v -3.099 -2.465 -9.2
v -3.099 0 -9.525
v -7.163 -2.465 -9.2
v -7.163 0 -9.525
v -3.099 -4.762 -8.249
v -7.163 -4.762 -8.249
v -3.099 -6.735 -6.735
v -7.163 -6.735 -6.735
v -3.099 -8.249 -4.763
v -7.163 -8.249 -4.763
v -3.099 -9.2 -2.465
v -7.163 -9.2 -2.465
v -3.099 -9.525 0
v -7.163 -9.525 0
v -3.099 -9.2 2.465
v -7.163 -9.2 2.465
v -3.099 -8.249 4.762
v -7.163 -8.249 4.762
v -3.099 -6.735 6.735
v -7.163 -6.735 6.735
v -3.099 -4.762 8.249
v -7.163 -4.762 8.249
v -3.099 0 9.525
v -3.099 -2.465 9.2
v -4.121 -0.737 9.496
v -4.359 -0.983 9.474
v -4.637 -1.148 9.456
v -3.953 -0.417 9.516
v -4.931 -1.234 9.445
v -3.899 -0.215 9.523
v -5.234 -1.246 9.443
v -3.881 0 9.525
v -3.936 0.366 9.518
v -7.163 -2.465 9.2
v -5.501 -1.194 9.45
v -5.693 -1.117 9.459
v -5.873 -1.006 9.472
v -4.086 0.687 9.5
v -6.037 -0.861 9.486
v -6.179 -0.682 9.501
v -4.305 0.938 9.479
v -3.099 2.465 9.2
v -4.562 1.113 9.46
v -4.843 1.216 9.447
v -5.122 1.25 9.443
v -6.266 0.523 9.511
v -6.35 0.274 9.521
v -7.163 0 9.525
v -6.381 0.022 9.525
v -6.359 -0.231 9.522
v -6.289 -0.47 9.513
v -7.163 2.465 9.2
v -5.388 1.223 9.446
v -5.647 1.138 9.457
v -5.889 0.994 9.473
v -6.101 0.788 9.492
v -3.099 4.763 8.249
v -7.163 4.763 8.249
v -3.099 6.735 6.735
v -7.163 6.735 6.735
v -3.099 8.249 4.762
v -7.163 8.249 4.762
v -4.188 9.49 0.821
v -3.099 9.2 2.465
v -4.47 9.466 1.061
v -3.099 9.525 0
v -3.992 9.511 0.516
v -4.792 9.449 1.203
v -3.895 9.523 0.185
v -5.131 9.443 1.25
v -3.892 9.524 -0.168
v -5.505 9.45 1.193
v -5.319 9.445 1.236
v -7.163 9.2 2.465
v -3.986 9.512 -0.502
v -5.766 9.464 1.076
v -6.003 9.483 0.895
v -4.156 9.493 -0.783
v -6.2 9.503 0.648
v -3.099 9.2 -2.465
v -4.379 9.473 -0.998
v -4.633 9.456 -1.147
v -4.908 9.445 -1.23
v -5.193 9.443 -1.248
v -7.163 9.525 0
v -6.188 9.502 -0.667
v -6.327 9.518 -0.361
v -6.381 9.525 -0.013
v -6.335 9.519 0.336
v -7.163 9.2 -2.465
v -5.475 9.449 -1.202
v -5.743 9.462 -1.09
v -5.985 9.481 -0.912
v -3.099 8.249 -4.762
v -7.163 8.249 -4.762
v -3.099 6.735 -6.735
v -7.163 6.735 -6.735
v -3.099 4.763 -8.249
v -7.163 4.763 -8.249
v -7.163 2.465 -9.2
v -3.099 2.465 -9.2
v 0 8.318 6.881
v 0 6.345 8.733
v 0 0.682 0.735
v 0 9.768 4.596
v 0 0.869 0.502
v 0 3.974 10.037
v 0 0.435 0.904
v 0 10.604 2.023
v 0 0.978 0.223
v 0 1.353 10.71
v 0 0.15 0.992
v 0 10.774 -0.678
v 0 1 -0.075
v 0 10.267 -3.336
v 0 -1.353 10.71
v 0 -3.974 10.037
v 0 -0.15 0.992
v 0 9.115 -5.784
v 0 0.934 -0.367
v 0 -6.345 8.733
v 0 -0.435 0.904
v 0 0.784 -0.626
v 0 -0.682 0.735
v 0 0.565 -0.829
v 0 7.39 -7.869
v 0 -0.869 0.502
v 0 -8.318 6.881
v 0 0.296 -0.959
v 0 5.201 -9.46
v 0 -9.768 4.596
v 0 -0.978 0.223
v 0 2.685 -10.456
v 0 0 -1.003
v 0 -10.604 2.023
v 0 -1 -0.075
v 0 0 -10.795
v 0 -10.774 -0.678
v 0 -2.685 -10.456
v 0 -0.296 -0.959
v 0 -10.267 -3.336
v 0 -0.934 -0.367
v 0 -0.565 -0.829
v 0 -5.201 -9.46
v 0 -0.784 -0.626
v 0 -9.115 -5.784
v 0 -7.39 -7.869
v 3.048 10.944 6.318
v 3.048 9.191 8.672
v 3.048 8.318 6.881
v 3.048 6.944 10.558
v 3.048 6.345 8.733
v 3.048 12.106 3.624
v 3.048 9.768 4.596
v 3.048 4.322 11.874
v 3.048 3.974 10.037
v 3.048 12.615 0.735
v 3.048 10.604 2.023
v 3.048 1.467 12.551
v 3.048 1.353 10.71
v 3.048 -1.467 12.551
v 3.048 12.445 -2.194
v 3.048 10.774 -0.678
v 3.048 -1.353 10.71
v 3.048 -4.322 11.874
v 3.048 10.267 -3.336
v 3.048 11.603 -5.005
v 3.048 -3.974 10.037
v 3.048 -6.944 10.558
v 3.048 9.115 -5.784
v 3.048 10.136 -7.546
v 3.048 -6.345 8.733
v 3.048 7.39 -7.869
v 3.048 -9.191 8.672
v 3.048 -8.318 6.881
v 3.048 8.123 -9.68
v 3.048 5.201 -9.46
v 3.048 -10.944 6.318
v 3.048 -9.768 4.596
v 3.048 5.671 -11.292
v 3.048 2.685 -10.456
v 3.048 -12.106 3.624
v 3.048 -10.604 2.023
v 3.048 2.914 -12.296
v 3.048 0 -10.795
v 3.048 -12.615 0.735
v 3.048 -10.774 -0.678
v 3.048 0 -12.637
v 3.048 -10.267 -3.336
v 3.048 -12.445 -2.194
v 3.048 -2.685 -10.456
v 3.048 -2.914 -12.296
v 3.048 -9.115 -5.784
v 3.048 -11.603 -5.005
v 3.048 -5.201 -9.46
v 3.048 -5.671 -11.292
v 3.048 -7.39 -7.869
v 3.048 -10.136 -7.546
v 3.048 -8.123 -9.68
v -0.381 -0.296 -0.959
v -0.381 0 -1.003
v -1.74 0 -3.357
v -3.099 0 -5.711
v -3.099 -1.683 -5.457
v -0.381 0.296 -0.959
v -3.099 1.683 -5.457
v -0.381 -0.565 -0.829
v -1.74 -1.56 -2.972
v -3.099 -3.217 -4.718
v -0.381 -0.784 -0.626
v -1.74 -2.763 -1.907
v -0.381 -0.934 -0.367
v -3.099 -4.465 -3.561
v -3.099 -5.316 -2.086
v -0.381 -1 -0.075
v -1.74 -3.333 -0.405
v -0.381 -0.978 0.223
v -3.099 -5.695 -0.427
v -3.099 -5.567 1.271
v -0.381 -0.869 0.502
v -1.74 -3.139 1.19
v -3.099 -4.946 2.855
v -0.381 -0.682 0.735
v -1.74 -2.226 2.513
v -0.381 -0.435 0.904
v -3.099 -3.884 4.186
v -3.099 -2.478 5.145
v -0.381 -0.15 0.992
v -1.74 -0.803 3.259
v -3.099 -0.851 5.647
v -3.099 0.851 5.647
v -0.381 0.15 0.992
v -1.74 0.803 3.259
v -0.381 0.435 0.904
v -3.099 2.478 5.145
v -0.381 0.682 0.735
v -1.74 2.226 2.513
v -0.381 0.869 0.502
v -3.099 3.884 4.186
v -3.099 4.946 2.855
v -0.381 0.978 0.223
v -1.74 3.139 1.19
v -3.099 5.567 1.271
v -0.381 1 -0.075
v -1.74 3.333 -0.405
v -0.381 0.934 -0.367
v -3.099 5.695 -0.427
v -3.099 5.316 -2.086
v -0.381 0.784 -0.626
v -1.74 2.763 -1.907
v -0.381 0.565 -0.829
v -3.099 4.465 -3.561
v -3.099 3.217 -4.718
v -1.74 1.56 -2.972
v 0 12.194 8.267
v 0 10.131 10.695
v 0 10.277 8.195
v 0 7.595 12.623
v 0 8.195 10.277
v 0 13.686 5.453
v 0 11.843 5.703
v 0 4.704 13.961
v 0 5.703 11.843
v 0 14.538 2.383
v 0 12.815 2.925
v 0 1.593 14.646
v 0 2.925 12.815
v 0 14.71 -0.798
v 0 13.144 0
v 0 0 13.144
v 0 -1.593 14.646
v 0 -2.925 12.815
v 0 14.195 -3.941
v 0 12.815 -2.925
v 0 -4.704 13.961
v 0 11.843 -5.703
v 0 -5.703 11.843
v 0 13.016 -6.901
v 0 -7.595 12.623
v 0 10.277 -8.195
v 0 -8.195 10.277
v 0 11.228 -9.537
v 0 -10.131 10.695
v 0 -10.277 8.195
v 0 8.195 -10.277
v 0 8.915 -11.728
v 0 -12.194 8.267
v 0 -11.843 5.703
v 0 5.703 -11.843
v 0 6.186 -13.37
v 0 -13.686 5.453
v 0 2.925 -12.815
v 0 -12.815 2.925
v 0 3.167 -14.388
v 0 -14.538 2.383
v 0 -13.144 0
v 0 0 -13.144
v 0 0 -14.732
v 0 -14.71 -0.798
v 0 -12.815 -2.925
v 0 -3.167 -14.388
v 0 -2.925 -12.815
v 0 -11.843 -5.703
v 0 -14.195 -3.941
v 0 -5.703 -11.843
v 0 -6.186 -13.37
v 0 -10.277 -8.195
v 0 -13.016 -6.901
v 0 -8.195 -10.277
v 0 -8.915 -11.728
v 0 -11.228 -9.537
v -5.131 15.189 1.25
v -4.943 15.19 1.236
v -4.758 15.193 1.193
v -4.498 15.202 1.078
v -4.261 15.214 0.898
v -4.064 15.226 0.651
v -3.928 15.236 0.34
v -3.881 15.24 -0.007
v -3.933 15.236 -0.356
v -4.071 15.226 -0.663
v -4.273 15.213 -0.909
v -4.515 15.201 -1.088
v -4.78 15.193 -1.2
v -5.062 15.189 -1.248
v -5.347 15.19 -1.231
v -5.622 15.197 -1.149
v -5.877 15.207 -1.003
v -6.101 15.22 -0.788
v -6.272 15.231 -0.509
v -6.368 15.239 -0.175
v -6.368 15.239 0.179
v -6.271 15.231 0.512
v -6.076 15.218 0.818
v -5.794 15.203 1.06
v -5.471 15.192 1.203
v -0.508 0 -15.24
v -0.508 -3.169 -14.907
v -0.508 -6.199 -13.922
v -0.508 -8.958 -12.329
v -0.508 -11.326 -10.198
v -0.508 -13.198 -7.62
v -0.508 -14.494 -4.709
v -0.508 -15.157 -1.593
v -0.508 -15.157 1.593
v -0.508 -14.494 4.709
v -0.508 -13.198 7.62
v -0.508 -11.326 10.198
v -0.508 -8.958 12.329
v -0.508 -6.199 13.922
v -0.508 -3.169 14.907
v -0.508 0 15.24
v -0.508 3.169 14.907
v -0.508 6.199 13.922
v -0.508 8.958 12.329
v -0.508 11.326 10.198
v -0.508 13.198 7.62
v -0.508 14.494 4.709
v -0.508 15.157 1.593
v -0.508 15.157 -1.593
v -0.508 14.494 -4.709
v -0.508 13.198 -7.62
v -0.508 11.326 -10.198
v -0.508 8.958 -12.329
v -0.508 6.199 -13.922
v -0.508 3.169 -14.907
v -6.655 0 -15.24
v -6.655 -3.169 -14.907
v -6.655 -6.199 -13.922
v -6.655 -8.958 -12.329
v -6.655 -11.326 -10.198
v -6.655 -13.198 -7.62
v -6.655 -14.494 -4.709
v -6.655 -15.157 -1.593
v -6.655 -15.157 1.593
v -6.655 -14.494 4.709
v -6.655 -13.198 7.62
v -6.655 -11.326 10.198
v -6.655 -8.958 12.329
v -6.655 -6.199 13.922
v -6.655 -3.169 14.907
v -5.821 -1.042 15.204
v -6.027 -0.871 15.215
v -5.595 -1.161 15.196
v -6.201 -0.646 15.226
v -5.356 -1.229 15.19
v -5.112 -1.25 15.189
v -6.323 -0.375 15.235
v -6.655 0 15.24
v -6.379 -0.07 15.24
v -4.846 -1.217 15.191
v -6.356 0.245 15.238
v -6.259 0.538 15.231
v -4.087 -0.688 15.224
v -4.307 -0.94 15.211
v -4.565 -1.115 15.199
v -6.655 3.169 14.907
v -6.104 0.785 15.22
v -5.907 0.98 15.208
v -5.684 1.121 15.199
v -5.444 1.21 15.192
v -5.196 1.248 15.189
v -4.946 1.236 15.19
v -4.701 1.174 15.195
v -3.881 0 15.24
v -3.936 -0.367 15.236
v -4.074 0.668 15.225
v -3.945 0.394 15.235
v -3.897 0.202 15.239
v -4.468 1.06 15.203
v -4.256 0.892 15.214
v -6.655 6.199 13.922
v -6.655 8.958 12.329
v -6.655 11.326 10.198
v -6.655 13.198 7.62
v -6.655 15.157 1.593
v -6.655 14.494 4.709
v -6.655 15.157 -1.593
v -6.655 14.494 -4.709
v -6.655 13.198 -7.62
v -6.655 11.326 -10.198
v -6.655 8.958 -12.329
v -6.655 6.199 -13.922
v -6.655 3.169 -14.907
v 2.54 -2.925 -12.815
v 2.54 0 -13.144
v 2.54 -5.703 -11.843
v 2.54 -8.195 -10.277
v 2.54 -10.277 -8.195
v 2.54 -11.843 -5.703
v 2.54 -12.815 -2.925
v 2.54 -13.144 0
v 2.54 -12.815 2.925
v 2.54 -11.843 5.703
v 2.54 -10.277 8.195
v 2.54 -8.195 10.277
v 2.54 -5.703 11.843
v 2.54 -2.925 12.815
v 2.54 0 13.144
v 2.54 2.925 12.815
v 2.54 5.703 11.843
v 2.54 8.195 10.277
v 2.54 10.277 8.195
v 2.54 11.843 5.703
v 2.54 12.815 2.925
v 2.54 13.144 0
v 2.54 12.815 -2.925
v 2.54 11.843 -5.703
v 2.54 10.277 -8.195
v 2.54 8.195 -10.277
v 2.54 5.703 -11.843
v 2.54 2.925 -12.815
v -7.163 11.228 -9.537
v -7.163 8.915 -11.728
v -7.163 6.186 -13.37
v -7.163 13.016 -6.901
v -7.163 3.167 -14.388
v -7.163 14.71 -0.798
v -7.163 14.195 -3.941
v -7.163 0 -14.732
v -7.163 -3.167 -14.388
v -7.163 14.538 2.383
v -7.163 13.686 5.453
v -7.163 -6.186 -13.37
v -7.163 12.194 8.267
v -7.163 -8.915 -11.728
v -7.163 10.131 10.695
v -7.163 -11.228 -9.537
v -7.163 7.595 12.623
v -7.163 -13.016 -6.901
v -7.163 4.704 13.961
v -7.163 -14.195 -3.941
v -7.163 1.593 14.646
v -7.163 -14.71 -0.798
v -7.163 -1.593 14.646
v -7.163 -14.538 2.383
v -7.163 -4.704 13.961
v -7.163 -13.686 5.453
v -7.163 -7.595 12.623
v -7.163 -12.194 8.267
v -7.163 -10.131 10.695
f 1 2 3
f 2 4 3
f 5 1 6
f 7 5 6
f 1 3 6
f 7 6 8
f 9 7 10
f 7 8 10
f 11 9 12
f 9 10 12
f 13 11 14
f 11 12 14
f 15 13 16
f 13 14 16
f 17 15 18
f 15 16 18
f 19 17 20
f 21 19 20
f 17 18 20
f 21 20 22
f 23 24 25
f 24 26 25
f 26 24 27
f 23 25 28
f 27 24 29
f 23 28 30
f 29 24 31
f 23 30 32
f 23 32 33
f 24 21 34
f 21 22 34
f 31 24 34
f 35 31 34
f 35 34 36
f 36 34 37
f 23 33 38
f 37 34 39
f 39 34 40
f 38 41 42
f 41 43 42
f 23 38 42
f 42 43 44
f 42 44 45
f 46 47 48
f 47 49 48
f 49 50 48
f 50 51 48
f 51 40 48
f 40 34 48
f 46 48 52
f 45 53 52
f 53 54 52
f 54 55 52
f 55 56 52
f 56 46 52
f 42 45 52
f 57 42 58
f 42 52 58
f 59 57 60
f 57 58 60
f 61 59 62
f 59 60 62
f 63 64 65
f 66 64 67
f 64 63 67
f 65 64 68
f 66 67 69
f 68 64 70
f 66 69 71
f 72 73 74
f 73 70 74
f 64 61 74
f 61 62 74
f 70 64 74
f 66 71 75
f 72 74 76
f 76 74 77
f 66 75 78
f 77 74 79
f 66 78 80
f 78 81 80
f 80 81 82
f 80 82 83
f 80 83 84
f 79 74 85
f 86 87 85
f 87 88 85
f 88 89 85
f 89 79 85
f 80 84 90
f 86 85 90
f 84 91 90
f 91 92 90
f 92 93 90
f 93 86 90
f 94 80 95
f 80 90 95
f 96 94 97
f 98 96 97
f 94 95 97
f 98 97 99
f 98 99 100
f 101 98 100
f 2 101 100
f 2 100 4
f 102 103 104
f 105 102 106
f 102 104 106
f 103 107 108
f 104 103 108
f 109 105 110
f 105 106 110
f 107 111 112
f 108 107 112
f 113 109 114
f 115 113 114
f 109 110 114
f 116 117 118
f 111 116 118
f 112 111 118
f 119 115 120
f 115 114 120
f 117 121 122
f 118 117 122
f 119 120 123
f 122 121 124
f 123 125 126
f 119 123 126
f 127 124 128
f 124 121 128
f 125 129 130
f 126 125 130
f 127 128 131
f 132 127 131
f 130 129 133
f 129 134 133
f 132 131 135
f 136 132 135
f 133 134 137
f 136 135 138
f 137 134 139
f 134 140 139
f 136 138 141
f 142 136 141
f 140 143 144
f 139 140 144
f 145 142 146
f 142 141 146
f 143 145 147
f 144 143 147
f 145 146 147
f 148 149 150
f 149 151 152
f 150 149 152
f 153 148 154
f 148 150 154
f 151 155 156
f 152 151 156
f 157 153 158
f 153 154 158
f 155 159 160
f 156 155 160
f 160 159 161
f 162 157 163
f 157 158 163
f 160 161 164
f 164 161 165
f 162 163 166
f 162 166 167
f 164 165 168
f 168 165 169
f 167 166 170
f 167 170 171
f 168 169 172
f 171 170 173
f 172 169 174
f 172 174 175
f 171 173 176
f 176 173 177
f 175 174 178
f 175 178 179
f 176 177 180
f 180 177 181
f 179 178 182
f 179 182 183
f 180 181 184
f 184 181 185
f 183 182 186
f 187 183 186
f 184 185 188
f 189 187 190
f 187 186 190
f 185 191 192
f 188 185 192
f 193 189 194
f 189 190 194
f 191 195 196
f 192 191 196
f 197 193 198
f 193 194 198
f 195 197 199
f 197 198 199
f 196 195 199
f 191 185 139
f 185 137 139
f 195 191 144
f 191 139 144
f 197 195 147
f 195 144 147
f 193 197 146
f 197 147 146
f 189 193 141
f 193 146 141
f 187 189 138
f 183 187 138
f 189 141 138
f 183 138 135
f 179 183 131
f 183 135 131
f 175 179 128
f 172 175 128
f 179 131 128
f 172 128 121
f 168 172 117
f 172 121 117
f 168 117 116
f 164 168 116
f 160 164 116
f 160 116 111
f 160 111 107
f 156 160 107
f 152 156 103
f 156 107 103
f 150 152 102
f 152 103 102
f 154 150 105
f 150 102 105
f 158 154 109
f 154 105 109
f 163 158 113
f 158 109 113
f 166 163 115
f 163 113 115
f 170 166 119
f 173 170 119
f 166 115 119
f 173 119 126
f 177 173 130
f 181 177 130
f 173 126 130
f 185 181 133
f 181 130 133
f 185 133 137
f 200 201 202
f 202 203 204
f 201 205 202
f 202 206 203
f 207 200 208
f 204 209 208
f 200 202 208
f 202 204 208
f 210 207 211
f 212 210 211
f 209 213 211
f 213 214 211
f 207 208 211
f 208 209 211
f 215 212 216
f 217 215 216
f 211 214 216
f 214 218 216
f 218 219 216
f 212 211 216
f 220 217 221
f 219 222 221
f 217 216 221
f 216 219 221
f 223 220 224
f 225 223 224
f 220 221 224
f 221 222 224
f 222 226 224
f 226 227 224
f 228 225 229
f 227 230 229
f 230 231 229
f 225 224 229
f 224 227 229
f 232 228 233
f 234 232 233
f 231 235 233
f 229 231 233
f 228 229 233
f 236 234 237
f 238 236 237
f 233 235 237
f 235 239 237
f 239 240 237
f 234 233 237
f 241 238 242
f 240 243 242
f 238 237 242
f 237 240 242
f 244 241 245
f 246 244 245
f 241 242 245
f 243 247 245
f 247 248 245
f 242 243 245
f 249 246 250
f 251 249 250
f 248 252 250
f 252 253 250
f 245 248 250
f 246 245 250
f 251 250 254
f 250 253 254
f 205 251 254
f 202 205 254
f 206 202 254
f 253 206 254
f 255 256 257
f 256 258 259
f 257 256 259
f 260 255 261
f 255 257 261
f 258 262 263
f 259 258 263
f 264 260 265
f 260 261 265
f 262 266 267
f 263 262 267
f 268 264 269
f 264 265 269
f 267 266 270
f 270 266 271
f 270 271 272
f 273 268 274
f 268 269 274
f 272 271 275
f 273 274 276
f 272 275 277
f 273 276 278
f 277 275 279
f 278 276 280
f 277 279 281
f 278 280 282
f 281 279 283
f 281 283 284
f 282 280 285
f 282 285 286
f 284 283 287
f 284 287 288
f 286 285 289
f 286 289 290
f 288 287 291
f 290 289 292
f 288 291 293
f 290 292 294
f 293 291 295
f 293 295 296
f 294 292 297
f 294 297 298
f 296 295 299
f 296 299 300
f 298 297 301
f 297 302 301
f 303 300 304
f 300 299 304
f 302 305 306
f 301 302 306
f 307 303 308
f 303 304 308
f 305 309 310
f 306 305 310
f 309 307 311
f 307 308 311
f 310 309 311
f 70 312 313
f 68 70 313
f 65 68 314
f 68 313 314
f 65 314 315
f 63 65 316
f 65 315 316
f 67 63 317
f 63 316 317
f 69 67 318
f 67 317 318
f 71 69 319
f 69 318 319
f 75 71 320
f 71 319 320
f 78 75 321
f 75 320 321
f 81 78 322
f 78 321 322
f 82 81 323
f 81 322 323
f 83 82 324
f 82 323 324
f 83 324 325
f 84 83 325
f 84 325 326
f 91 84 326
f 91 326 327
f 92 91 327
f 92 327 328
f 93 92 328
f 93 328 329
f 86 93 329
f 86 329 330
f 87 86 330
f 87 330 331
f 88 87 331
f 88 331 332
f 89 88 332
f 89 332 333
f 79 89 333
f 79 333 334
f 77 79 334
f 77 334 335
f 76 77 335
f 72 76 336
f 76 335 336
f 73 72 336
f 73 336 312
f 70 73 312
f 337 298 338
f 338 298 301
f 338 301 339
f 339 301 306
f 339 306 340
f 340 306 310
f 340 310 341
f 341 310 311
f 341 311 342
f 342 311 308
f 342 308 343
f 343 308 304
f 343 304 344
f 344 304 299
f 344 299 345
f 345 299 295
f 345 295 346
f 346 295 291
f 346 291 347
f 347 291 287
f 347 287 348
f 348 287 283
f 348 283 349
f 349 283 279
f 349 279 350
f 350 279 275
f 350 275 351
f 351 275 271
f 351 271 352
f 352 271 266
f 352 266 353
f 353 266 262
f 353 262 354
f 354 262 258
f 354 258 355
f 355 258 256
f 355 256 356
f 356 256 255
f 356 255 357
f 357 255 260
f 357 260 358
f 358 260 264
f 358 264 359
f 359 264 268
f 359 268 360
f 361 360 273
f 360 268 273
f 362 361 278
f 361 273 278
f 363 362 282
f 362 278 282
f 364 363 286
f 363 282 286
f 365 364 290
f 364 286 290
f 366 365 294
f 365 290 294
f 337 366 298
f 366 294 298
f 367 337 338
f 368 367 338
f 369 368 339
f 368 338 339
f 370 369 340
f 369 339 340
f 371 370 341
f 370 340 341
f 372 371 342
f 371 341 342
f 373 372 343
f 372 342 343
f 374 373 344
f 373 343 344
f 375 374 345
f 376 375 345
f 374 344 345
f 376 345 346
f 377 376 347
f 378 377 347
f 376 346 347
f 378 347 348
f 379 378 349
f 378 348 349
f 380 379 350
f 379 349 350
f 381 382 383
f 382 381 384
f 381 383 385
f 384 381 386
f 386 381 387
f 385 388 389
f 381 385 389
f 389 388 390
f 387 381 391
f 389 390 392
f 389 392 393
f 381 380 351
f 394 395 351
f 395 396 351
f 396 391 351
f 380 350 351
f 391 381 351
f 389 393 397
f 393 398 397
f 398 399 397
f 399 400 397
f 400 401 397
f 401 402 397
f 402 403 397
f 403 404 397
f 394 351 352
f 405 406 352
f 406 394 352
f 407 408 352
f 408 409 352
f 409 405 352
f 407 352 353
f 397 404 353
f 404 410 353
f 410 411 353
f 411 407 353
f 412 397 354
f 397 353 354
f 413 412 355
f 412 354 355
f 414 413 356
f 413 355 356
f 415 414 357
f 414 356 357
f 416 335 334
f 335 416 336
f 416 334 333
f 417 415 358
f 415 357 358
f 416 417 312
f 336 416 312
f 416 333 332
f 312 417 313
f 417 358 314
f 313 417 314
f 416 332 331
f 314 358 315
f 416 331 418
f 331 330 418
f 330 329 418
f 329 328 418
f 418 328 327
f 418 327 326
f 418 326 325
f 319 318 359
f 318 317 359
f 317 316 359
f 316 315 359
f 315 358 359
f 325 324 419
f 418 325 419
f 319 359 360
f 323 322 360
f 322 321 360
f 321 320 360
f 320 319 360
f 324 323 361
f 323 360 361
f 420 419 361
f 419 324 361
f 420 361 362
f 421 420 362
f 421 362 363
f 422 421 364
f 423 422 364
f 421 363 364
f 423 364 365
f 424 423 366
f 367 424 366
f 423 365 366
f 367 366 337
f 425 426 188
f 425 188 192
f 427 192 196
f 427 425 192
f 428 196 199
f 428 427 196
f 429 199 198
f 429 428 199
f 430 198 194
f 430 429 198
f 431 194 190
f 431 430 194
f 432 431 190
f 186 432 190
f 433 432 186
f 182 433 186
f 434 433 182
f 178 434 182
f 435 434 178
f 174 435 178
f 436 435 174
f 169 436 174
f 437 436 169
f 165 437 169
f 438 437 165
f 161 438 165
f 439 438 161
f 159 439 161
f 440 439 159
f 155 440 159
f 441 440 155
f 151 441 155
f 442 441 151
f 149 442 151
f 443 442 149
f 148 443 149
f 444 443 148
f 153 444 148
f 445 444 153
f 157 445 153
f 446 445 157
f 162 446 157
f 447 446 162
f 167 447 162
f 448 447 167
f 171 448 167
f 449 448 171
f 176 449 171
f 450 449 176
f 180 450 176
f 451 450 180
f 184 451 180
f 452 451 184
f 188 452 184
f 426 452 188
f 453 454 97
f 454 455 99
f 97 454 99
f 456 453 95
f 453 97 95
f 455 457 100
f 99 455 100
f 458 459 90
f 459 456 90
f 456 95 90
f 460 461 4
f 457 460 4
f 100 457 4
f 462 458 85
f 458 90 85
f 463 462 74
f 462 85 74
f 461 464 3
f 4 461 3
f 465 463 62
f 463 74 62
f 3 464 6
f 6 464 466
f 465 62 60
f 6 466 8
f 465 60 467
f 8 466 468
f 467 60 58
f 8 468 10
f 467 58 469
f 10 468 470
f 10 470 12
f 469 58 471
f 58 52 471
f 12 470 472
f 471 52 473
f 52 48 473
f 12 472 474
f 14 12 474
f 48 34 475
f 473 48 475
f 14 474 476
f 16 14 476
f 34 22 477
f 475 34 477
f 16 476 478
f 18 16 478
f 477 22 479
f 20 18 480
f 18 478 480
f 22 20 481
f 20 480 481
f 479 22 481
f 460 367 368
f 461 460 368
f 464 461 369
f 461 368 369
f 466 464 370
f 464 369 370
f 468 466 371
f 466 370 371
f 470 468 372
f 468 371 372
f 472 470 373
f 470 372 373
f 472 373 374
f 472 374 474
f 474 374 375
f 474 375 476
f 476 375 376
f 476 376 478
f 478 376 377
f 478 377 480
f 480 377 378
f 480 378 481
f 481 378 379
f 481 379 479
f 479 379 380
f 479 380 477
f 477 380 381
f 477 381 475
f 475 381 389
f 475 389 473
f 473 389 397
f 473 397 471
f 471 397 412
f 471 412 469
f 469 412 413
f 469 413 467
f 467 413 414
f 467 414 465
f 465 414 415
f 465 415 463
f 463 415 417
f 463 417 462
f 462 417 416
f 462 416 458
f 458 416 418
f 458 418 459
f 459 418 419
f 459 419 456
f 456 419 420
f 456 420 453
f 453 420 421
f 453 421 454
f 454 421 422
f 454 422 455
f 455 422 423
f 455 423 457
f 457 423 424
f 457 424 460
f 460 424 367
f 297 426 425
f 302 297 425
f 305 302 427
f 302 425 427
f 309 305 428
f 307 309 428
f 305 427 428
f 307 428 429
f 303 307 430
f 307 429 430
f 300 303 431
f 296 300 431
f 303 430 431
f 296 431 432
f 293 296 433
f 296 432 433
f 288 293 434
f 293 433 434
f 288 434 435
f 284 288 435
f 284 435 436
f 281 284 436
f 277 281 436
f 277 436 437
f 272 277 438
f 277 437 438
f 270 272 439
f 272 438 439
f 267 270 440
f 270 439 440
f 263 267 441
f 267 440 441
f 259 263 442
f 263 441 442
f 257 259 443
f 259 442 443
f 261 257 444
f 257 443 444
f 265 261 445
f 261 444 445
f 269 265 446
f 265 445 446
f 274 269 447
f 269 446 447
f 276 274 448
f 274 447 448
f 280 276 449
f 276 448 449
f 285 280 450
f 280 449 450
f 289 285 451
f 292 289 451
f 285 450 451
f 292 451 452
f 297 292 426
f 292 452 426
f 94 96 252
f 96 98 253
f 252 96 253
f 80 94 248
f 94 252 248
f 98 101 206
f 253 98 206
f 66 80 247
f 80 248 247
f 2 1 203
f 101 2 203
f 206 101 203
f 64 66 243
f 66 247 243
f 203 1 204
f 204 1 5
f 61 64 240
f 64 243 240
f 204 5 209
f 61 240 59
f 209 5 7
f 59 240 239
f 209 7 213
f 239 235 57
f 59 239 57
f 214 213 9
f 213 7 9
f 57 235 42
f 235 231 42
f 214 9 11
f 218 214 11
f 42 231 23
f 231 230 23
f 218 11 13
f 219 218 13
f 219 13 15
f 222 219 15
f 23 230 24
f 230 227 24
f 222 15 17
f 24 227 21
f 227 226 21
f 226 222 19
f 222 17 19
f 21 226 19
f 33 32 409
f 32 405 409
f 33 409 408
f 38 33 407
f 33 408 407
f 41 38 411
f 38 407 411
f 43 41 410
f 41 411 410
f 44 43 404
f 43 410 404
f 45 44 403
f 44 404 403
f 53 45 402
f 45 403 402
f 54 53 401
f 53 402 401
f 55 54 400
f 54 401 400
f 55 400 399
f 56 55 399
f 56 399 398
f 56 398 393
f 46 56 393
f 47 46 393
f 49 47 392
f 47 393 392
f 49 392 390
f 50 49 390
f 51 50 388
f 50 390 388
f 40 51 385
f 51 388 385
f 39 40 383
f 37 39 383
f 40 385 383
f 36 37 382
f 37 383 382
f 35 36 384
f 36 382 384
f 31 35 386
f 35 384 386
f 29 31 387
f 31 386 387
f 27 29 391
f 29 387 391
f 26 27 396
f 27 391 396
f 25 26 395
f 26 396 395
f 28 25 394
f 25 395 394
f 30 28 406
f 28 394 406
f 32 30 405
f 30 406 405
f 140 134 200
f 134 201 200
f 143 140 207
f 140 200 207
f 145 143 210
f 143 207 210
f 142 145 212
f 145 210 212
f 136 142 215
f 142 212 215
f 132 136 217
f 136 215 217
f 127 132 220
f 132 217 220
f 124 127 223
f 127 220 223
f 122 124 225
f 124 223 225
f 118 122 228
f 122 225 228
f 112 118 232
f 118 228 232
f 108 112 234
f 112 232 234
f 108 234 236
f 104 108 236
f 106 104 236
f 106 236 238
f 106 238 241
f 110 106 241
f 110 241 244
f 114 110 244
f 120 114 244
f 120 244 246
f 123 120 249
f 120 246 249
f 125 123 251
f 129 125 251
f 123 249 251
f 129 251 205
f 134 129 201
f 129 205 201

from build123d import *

# Parameters (mm, degrees)
M3X0_5_TAPPED_HOLE1_REACH           = 32.48
M3X0_5_TAPPED_HOLE1_BORE_R          = 1.25
M3X0_5_TAPPED_HOLE1_ON_FACE_2_REACH = 32.48
M3X0_5_TAPPED_HOLE1_BORE_2_R        = 1.25
CHAMFER1_SIZE                       = 0.508


with BuildPart() as part:
    # Sketch1 → Revolve1 (revolve)
    with BuildSketch(Plane.XY, mode=Mode.PRIVATE) as revolve1_sk:
        Polygon((-0.381, 1.0033), (-3.0988, 5.710667685), (-3.0988, 9.525), (-7.1628, 9.525), (-7.1628, 15.24), (0, 15.24), (0, 13.1445), (3.048, 13.1445), (3.048, 10.795), (0, 10.795), (0, 1.0033), align=None)
    revolve(revolve1_sk.sketch.rotate(Axis((0, 0, 0), (-1, 0, 0)), 90), axis=Axis((0, 0, 0), (-1, 0, 0)))  # turned: the seam where the file's is

    # M3x0.5 Tapped Hole1 bore (on position points) → M3x0.5 Tapped Hole1 (cut, up to next)
    with BuildSketch(Plane(origin=(-5.1308, 15.24, 0), x_dir=(0, 0, 1), z_dir=(0, 1, 0)), mode=Mode.PRIVATE) as m3x0_5_tapped_hole1_sk1:
        Circle(M3X0_5_TAPPED_HOLE1_BORE_R)
    m3x0_5_tapped_hole1_tool1 = extrude(m3x0_5_tapped_hole1_sk1.sketch, amount=-M3X0_5_TAPPED_HOLE1_REACH, mode=Mode.PRIVATE) & part.part
    add(m3x0_5_tapped_hole1_tool1.solids().sort_by_distance((-5.1308, 15.24, 0))[0], mode=Mode.SUBTRACT)

    # M3x0.5 Tapped Hole1 bore 2 (on position points) → M3x0.5 Tapped Hole1 on face 2 (cut, up to next)
    with BuildSketch(Plane(origin=(-5.1308, 0, 15.24), x_dir=(1, 0, 0), z_dir=(0, 0, 1)), mode=Mode.PRIVATE) as m3x0_5_tapped_hole1_on_face_2_sk1:
        Circle(M3X0_5_TAPPED_HOLE1_BORE_2_R)
    m3x0_5_tapped_hole1_on_face_2_tool1 = extrude(m3x0_5_tapped_hole1_on_face_2_sk1.sketch, amount=-M3X0_5_TAPPED_HOLE1_ON_FACE_2_REACH, mode=Mode.PRIVATE) & part.part
    add(m3x0_5_tapped_hole1_on_face_2_tool1.solids().sort_by_distance((-5.1308, 0, 15.24))[0], mode=Mode.SUBTRACT)

    # Chamfer1
    chamfer1_edges = [part.edges().sort_by_distance(p)[0] for p in [
        (-7.1628, 0, 15.24),
        (0, 0, 15.24),
        (3.048, 0, 13.1445),
    ]]
    chamfer(chamfer1_edges, length=CHAMFER1_SIZE)


solid = part.part
